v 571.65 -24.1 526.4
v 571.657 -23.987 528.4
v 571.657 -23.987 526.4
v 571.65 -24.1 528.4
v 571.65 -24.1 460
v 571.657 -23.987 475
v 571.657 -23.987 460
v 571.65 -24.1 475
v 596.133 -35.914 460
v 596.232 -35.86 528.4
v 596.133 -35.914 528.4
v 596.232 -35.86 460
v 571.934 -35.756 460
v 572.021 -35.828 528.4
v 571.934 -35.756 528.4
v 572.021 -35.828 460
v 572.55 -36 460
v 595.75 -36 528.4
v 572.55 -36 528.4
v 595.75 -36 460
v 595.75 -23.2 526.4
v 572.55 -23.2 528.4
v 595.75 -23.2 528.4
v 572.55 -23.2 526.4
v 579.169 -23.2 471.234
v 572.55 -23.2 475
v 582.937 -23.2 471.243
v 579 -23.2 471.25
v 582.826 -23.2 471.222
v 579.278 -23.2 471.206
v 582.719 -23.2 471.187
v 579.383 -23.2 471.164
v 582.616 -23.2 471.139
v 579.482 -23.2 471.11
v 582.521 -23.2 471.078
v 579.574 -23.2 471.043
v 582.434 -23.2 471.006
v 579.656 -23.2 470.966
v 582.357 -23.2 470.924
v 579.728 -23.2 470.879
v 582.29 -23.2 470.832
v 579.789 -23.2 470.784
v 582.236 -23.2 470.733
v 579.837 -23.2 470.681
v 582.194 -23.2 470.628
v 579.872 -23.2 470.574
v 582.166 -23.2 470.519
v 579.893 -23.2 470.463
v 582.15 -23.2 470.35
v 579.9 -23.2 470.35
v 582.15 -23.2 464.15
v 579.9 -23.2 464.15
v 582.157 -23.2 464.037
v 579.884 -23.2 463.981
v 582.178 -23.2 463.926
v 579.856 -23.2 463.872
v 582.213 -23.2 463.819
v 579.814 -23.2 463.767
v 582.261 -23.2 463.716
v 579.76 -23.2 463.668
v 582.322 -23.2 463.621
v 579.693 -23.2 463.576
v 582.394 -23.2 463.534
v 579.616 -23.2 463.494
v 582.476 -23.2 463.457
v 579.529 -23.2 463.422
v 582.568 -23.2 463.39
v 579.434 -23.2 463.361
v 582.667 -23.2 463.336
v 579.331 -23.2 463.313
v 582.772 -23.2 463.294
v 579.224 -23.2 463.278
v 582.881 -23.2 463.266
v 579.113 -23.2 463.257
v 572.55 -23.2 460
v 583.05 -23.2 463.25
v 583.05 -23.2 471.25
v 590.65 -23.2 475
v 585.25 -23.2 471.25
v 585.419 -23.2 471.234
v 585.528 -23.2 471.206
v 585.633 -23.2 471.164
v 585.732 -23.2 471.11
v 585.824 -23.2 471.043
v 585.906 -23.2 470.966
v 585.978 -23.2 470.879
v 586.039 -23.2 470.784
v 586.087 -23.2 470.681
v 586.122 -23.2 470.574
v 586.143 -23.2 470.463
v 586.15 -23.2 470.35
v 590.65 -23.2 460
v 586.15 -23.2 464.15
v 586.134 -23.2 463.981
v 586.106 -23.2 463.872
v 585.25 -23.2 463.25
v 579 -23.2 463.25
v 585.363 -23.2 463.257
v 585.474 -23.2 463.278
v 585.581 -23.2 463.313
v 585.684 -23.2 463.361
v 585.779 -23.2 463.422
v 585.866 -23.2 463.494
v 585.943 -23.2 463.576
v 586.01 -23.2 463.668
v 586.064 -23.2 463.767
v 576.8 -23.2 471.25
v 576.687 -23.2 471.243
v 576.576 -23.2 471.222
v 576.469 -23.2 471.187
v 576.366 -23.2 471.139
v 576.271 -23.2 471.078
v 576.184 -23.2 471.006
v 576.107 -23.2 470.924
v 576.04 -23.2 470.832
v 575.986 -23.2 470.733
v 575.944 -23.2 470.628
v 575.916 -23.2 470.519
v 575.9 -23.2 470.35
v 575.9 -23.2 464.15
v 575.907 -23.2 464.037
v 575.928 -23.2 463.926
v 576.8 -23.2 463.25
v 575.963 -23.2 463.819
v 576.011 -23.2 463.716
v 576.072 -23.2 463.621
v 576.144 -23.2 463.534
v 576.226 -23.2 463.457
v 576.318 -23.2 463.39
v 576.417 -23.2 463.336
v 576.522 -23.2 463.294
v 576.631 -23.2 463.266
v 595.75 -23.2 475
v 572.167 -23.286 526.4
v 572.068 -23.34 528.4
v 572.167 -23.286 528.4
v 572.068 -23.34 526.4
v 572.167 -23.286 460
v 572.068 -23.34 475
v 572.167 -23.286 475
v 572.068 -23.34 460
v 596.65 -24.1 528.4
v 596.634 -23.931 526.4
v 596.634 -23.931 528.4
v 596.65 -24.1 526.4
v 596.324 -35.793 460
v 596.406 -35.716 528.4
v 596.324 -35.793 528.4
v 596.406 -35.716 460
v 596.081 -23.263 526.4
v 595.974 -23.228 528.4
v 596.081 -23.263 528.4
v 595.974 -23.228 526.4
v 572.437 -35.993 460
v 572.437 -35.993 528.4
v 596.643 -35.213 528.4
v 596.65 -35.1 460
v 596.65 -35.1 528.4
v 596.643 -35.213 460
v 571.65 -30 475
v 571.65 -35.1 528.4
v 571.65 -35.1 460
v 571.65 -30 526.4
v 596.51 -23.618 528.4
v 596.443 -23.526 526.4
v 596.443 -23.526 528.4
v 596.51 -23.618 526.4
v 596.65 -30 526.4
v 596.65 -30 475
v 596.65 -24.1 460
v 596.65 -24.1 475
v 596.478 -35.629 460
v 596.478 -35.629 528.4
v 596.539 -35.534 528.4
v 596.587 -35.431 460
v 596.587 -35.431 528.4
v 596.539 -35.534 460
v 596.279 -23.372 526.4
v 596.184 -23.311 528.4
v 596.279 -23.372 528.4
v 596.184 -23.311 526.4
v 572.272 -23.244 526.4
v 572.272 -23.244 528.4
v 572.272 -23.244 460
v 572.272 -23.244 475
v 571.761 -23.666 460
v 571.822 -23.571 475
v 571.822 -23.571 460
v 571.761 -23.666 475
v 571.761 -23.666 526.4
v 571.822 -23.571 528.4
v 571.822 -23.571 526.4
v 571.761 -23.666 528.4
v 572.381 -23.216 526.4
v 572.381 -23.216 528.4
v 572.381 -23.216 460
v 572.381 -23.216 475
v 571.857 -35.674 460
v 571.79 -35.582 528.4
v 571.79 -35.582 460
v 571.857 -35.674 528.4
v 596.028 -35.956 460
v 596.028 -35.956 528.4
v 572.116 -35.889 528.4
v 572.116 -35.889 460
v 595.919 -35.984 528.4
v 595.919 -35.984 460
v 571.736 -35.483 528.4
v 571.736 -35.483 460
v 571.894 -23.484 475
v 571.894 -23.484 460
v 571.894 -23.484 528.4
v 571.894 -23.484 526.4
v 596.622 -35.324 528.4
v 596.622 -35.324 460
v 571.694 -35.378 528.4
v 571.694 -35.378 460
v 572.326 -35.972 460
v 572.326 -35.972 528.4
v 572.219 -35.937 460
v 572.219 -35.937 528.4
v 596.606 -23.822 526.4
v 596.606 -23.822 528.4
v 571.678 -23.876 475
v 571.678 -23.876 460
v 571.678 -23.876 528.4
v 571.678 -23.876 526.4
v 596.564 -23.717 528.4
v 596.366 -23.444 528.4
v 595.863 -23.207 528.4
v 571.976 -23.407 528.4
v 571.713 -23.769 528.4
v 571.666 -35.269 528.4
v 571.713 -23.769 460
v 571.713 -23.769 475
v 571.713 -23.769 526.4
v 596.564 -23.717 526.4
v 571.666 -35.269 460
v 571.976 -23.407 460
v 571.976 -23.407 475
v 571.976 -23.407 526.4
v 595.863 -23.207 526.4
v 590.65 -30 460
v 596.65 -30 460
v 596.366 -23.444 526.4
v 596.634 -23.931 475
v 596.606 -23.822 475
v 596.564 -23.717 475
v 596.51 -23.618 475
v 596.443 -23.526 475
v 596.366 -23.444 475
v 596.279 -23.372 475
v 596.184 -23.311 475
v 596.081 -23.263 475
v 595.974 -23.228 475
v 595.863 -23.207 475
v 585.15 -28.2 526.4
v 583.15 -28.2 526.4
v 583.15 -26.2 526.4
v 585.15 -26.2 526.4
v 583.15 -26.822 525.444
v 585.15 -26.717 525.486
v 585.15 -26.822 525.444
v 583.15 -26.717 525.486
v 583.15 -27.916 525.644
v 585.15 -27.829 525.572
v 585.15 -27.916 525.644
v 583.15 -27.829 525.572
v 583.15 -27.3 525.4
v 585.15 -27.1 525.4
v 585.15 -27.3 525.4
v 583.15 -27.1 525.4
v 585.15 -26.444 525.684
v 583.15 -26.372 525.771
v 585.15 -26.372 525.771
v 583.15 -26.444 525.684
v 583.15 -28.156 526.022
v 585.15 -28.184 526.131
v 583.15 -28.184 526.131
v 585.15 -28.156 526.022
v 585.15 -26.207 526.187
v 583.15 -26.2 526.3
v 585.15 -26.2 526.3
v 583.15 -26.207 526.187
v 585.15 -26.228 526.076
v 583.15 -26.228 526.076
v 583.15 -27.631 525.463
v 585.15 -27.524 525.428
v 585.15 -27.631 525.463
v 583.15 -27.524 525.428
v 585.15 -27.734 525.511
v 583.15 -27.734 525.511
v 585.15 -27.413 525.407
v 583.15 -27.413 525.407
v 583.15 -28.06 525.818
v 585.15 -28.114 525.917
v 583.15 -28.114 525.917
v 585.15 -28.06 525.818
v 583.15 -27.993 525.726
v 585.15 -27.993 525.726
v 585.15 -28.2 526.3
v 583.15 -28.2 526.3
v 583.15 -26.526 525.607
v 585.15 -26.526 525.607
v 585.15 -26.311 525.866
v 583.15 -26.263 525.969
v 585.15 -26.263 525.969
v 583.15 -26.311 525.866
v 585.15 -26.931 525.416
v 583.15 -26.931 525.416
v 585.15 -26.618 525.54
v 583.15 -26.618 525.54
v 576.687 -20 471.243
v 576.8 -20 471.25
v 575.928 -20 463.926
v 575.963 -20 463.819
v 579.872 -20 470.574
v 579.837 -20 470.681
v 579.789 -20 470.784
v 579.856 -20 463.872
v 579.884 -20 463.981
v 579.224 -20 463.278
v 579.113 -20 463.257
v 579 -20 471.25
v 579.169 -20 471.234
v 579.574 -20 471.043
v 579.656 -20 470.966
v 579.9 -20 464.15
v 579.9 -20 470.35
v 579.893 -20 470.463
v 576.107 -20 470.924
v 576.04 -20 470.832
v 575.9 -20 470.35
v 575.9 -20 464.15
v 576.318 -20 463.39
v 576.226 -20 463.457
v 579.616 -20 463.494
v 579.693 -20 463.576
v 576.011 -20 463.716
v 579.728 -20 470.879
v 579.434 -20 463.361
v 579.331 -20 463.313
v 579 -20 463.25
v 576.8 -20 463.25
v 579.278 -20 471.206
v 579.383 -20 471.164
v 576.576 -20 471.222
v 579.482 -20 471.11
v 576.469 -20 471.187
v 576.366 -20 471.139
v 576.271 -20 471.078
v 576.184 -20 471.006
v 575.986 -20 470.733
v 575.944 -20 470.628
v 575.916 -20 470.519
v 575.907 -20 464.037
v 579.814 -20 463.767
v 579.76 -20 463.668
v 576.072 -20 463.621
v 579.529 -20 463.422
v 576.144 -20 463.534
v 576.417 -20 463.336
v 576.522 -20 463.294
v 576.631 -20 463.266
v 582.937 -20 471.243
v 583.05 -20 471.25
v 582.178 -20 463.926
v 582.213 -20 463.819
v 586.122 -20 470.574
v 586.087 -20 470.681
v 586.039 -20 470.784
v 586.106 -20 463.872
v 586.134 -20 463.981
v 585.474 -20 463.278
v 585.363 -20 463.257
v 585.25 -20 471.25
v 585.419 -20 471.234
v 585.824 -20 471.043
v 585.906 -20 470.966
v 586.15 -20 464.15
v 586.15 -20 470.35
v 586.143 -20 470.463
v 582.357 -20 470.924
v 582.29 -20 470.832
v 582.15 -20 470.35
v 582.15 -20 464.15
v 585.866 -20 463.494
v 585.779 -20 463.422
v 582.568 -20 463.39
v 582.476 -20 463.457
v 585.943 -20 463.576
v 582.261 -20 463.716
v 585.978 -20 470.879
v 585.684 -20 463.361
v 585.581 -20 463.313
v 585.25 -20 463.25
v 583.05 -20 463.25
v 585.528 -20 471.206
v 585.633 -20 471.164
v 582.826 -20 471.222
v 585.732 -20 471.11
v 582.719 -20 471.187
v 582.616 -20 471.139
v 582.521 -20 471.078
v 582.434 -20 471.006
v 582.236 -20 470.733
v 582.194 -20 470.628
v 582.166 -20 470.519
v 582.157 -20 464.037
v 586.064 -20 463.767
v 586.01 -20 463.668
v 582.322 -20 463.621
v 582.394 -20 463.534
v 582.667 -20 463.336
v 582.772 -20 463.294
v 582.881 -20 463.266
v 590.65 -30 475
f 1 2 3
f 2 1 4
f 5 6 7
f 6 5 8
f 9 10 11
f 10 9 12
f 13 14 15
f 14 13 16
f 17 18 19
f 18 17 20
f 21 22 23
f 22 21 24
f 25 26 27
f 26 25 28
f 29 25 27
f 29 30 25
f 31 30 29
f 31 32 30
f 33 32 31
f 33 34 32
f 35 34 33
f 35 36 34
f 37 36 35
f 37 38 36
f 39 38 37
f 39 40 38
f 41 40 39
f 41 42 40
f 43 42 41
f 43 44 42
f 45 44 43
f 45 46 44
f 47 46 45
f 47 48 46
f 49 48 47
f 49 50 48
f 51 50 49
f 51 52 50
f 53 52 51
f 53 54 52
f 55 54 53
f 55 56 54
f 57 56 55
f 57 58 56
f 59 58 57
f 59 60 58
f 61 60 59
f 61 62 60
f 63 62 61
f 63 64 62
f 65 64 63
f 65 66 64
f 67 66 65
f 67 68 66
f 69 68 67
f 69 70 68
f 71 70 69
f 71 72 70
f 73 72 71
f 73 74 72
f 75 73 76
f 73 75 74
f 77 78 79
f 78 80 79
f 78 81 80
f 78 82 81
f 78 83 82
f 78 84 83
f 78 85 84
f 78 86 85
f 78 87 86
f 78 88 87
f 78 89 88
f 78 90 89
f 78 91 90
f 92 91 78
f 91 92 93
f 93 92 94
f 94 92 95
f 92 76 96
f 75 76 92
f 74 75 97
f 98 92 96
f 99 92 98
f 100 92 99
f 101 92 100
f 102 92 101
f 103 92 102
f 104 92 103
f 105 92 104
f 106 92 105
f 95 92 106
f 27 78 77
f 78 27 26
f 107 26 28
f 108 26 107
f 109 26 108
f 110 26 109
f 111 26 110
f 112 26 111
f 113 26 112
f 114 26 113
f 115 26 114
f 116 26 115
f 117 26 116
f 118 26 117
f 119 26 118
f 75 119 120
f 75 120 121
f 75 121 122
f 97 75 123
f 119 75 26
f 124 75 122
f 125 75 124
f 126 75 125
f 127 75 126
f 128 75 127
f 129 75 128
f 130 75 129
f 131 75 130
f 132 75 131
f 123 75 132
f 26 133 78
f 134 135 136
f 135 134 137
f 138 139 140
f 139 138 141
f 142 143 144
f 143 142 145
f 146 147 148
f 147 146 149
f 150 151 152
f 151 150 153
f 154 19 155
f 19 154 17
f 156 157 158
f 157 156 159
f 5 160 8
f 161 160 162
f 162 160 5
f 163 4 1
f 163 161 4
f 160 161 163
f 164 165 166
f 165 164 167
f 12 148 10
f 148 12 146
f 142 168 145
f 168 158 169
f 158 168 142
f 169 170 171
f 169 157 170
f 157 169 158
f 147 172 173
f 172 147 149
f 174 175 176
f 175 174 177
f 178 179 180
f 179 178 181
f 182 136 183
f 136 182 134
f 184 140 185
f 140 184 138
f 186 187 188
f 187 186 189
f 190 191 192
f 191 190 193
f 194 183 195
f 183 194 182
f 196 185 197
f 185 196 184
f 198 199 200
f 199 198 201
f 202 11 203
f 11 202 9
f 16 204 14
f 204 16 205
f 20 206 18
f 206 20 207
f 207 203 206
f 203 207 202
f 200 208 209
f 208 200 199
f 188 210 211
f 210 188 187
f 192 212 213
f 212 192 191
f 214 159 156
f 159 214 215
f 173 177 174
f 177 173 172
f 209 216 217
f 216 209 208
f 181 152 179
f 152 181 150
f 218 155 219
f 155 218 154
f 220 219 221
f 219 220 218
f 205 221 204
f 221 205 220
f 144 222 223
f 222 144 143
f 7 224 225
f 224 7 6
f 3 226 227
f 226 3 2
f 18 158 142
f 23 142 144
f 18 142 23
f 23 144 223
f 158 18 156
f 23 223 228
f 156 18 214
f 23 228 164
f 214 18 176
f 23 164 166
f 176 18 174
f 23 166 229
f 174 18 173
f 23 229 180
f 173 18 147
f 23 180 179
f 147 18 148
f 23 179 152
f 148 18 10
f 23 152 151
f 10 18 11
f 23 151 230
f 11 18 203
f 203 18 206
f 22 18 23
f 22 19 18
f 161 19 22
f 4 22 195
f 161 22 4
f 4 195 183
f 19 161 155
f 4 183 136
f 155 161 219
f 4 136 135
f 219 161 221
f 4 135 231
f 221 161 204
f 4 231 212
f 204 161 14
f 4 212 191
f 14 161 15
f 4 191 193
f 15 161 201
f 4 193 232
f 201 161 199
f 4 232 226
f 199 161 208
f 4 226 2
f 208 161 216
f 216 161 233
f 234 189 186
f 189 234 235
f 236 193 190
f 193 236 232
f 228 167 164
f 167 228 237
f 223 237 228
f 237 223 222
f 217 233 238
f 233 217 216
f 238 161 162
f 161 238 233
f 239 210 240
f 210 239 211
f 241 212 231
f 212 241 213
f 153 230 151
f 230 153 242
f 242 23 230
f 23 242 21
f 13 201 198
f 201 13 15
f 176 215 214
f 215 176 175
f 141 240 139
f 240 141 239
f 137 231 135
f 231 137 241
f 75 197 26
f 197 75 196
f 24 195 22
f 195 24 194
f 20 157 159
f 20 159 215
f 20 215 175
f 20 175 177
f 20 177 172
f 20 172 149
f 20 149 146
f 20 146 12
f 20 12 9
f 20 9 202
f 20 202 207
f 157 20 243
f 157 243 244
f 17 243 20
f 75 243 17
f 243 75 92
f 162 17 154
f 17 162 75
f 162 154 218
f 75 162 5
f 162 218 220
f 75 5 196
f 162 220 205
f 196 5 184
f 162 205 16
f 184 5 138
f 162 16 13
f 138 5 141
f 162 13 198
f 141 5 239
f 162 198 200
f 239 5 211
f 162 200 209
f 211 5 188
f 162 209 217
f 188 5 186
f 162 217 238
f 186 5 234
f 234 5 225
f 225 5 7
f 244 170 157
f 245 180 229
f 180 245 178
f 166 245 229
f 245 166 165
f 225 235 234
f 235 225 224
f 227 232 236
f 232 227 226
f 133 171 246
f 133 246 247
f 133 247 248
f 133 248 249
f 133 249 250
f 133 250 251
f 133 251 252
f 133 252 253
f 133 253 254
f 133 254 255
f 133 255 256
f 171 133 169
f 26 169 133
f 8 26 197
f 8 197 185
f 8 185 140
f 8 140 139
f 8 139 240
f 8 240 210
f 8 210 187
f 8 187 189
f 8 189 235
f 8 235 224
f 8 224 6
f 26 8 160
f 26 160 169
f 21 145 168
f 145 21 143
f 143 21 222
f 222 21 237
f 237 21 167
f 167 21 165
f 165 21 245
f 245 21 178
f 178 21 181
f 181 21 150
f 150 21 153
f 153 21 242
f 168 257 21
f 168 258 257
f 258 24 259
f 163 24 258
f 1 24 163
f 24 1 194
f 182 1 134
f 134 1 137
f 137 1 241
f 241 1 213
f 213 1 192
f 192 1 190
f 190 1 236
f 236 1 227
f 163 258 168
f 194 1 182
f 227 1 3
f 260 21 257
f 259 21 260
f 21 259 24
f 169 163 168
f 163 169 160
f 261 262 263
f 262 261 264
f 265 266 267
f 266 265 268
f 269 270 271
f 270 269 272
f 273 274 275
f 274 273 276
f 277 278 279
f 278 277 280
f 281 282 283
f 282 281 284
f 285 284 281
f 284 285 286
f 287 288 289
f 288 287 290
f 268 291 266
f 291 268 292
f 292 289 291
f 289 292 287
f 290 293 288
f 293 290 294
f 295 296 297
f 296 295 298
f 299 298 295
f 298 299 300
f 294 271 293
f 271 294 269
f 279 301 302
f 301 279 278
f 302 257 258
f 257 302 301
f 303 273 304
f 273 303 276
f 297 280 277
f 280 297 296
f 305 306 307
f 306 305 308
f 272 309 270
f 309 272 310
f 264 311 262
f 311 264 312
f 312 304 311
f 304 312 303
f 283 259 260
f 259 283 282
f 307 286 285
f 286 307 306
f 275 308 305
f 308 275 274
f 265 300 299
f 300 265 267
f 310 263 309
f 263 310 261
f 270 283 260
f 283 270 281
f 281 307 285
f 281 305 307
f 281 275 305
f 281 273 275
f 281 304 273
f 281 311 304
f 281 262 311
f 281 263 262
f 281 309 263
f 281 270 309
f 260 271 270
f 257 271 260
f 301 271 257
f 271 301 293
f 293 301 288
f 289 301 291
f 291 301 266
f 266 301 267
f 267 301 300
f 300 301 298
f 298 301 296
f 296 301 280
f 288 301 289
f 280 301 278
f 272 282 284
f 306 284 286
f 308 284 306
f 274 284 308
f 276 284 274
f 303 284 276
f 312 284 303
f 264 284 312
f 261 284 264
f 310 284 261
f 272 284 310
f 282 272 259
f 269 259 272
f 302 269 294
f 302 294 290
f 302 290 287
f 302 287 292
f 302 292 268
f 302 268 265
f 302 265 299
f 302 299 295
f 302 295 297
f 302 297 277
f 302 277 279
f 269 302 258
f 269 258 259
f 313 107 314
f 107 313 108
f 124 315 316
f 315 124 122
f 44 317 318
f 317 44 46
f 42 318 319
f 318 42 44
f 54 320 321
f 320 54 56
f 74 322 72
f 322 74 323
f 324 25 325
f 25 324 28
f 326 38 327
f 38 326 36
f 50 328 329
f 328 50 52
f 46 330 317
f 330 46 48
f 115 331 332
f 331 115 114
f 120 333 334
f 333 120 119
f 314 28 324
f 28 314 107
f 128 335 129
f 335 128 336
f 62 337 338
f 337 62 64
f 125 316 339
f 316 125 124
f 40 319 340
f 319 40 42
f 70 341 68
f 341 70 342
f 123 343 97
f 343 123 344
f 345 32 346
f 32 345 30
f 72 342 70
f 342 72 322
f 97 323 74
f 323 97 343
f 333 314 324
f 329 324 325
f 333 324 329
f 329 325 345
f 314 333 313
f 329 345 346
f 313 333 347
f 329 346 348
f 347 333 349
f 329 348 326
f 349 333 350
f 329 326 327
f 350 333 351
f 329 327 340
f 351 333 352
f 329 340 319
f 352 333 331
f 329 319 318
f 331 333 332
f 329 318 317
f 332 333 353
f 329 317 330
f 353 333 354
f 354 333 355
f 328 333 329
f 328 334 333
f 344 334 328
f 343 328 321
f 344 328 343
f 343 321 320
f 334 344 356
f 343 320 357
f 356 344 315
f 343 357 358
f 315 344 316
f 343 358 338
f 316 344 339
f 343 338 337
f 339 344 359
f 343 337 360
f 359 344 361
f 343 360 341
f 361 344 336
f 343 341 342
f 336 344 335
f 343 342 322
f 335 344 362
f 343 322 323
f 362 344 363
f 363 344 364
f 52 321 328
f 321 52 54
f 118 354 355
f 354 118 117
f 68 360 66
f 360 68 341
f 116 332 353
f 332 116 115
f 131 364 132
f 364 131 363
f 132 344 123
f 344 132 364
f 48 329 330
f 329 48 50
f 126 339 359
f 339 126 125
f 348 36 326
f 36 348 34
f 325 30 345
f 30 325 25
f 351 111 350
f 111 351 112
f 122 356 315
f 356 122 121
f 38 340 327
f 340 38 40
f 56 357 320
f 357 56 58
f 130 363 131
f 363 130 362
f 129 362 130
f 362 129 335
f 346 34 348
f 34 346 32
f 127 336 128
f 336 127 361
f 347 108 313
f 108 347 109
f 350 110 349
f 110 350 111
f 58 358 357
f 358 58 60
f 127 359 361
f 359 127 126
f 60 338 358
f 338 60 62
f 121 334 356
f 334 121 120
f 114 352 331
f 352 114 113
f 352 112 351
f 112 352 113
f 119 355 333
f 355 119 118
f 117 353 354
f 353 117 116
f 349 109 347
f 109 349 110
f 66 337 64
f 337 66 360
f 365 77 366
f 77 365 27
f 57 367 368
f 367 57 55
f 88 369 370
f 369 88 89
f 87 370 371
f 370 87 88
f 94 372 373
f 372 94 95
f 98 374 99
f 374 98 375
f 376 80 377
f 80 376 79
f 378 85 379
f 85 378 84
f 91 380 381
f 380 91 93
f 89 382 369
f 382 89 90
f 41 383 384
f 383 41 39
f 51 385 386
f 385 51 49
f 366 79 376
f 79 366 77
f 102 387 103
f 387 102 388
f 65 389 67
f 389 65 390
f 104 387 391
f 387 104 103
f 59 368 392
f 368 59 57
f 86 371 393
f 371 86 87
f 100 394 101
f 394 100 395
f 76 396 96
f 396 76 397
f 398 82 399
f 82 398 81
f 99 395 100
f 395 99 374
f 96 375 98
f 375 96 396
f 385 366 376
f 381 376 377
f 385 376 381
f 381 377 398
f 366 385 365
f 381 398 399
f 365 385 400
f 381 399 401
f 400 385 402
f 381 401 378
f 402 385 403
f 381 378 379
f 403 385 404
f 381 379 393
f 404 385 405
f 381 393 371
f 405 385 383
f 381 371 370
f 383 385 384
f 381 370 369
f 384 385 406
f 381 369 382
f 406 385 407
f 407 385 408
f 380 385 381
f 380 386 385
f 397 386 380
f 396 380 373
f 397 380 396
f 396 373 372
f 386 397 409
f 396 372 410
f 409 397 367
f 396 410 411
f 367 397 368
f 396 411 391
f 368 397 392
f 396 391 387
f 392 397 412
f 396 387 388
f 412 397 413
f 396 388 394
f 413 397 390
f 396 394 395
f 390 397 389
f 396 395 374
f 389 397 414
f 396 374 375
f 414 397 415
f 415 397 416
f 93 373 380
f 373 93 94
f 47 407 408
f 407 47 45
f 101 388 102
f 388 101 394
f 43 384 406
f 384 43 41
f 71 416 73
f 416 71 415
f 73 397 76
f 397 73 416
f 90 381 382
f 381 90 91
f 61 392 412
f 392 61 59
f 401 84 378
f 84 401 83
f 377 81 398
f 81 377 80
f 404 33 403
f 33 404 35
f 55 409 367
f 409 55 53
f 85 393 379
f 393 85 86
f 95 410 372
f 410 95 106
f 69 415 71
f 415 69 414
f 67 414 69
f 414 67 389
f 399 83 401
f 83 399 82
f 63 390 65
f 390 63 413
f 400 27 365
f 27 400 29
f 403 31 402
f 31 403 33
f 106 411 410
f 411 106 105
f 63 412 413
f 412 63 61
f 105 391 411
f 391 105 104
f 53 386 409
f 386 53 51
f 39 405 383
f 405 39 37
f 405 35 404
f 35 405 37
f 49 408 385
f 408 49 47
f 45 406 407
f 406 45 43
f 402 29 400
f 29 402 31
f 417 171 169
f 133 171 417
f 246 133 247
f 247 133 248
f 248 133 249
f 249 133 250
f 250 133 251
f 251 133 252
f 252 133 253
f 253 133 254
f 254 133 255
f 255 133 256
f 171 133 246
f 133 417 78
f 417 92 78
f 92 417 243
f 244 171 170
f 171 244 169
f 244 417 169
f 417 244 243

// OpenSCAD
// file: front_right_top_corner.scad
include <parameters.scad>
use <utility.scad>
use <support.scad>
use <construction.scad>

module front_right_top_corner() {
    difference() {
        translate([enclosure_width,0,enclosure_height-frame_corner_height]) 
            mirror([1,0,0])
                add_snap_lock_slot(top=true) 
                add_hinge_post(top=true)  
                add_outside_frame(frame_corner_height) 
                add_connector_slot()
                extend_frame_x()
                    color("SteelBlue")
                    frame_corner( frame_corner_width, 
                        frame_corner_height,frame_thickness, 
                        corner_roundness);
        fix_preview() right_wall_panel();
    }
}
// file: construction.scad
/*
Specialized construction functions specifically for the enclosure.
By combining these operators the various instances of enclosure pieces 
can be constructed.
*/
include <parameters.scad>;
use <utility.scad>;

module lug() {
    ra = knob_diameter/2;
    rb = lug_diameter/2;
    rotate([0,90,90]) 
        rotate_extrude()
            polygon([[0,0],[0,lug_height],[rb,lug_height],
                [rb,2.5],[ra,1],[ra,0]]);
}

// extend the corner frame to be symmetrical with the front corner
module extend_frame_x(height=frame_corner_height) {
    union() {
        children();
        color("SteelBlue")
        translate([hinge_inner_diameter*2, hinge_inner_diameter,0]) 
            rotate([0,0,-90])
                frame( hinge_inner_diameter*3+1, 
                    height, hinge_inner_diameter, 
                    corner_roundness );
    }
}

module frame( width, height, thickness, roundness ) {
        linear_extrude(height=height)
            apply_roundness(roundness, $fs =0.01) 
                    square( [thickness, width] );
}

module frame_corner( width, height, thickness, roundness ) {    
    union() {
        mirror([0,1,0]) 
            rotate([0,0,-90])
                frame( width, height, thickness, roundness );
        frame( width, height, thickness + panel_thickness, roundness );
    }   
}

module frame_connector_corner(clearance=0) {
    translate([panel_thickness*1.7,panel_thickness*0.70, 0]) 
        cornerize()
            frame( frame_corner_width*0.75, frame_connector_depth, 
                frame_thickness*.20+clearance, corner_roundness );
        
}

module add_lugs() {   
    union() {
        children();

        color("DarkSeaGreen")
        translate([lug_offset_x,-lug_height,lug_offset_z]) 
            lug();

        color("DarkSeaGreen")
        translate([lug_offset_x,-lug_height,
                lug_offset_z+lug_offset_gap])
            lug(); 
    } 
}

module add_connector(height=frame_corner_height) {
    union() {
        children();

        color("SteelBlue")
        translate([0,0,height])
            frame_connector_corner();
    }
}

module add_hinge_post( top=false ) {
    union() {
        difference() {
            children();

            // create a negative space that snuggly fits the hinge
            translate([frame_corner_width+plastic_thickness+hinge_gap,
                hinge_inner_diameter/2, (top?frame_corner_height:0)])
                mirror(top?[0,0,1]:[0,0,0])
                    union() {
                        height = hinge_height-hinge_inner_diameter;
                        translate([0,0,height/2-0.65]) 
                            cube([hinge_inner_diameter+2,
                                hinge_inner_diameter+2,height],true);
                        
                        // hinge open
                        rotate([0,0,-90]) 
                            translate([0,0,-1.4]) 
                                scale(1.05) hinge();
                        // hinge closed
                        rotate([0,0,0]) 
                            translate([0,0,-1.4]) 
                                scale(1.05) hinge();
                    }
            
        }
        color("SteelBlue")
        translate([frame_corner_width+plastic_thickness+hinge_gap,hinge_inner_diameter/2,0])
            cylinder(d=hinge_inner_diameter, frame_corner_height);
    }
}

module add_outside_frame( height ) {
    union() {
        children();
        translate([-plastic_thickness,-plastic_thickness,0])
            color("SteelBlue")
            frame( frame_corner_width+plastic_thickness, height, frame_thickness,
                corner_roundness);
        translate([14.5,0.05,height/2])
            color("SteelBlue")
            rotate([0,0,8])
            cube([frame_corner_width/2,plastic_thickness,height],true);
    }
}

module hinge() {
    height = hinge_height-hinge_inner_diameter;
    width = hinge_inner_diameter+hinge_ring_thickness;
    difference() {
        
        // create the base shape for the hinge
        union() {    
            cylinder(d=width, height);
            
            translate([hinge_inner_diameter*3+hinge_clearance,
                -hinge_offset,height/2-plastic_thickness/2]) 
                cube([hinge_length,hinge_thickness,
                    height+plastic_thickness],true);
           
            translate([2.52,-5.2,height/2]) 
                rotate([0,0,40]) 
                    cube([hinge_inner_diameter,
                        width+1,height],true);
        }
        
        // remove a hole for the hinge post to slide into
        cylinder(d=hinge_inner_diameter+tolerance_smooth, height+1);
        
        // trim the left corner
        translate([4,-17.5,height/2-1]) 
            rotate([0,0,145]) 
                cube([50,width-2,height+3],true);
        
        // smooth the tranistion to the bottom edge
        translate([19,-10,height/2-17.85]) 
            rotate([-88.5,0.1,96]) 
                cube([40,20,100],true);
        
        // add a chamfer to right corner
        translate([hinge_length+8,0,height+25]) 
            rotate([0,45,0]) 
            cube(50,true);
    }   
}

module add_connector_slot() {
    difference() {
        children();
        frame_connector_corner(tolerance_tight);
    }
}

module frame_vertical() {
    add_connector_slot()
    add_connector(frame_vertical_height)
    extend_frame_x(frame_vertical_height)
        frame_corner( frame_corner_width, 
            frame_vertical_height, frame_thickness, 
            corner_roundness );          
}

module add_snap_lock_slot(top=false) {
    difference() {
        children();
        translate([0,0,top?frame_corner_height+shelf_height:-shelf_height])
            mirror(top?[0,0,1]:[0,0,0])
                 snaplock(tolerance_tight,top);
    }
}

module snaplock(clearance=0,top=false) {
    
    union() {
        difference() {
            translate([snaplock_size,-snaplock_thickness*3,-plastic_thickness])
                rotate([0,0,90])
                    frame(snaplock_size+clearance,shelf_height+snaplock_connector_size+plastic_thickness+clearance,
                        snaplock_width*2+plastic_thickness, corner_roundness);
            fix_preview2() cube([snaplock_size*1.1,snaplock_width+plastic_thickness,shelf_height]);
        }
        // lug at bottom
        translate([snaplock_size - snaplock_size/2 - plastic_thickness/2,plastic_thickness-0.2,1])
            rotate([90,90,90])
                frame(plastic_thickness,plastic_thickness,plastic_thickness,corner_roundness);
        // connector
        translate([3*snaplock_size/4-connector_thickness/2,
            frame_connector_depth+snaplock_thickness,
            shelf_height+snaplock_connector_size/2 - (snaplock_connector_size/4)])
            rotate([90,0,0])
            frame(frame_connector_depth,snaplock_connector_size/2,
                connector_thickness,corner_roundness);
        translate([(top?2:1)*snaplock_size/4-connector_thickness/2,
            frame_connector_depth+snaplock_thickness,
            shelf_height+snaplock_connector_size/2 - (snaplock_connector_size/4)])
            rotate([90,0,0])
            frame(frame_connector_depth,snaplock_connector_size/2,
                connector_thickness,corner_roundness);
    }
}
// file: support.scad
/*
Provides support objects that are used to model the environment of the enclosure
to ensure the pieces slot together and fit properly.
*/
include <parameters.scad>;
use <utility.scad>;

module wall_panel() {
    cube([panel_height,panel_width,panel_thickness]);
}

module door_panel() {
     cube([door_panel_width,door_panel_height,door_panel_thickness]);
}

module left_wall_panel() {
    translate([panel_thickness,0,panel_offset_z]) 
        rotate([0,-90,0]) 
            wall_panel();
}

module back_wall_panel() {
    translate([(enclosure_width-panel_width)/2,
            enclosure_depth-panel_thickness-plastic_thickness,
            panel_offset_z]) 
        rotate([-90,-90,0]) 
            wall_panel();
}

module right_wall_panel() {
    translate([enclosure_width,0,panel_offset_z]) 
        rotate([0,-90,0]) 
            wall_panel();
}

module left_door(open=false) {
    translate([frame_corner_width+plastic_thickness+hinge_gap,
            hinge_inner_diameter/2,0]) 
        rotate([90,0,open?-90:0]) 
            translate([door_hinge_offset,0,hinge_offset-
                    door_panel_thickness/2])
                door_panel();
}

module right_door(open=false) {
    translate([enclosure_width,0,0])  
        mirror([1,0,0]) left_door(open);
}
// file: utility.scad
/*
Generically useful utility functions.
*/

// applies roundness without altering dimensions of object
module apply_roundness(r)
    offset(r) offset(delta=-r) children(0);

// makes a corner piece by mirroring and rotating one side
module cornerize() {
    union() {
        children(0);
        mirror([0,1,0]) 
            rotate([0,0,-90])
                children(0);
    }
} 

module explode(vector) {
    for(i=[0:$children-1])
        translate(vector*i)
            children(i);

}

/*
 The fix_preview series of functions are used to make small
 translations in order to reduce conincident plane artifacts
 from the preview mode. 

 It would be nice to have just one module for this but I haven't
 figured out a way of doing this generically - so the following
 uses a small translation in different directions depending on
 the use case needed.
*/
module fix_preview() {
    translate($preview?[-0.001,-0.001,-0.001]:[0,0,0])
        children(0);
}

module fix_preview2() {
    translate($preview?[-0.001,0.001,-0.001]:[0,0,0])
        children(0);
}

module fix_preview3() {
    translate($preview?[-0.001,0.001,0.001]:[0,0,0])
        children(0);
}
// file: parameters.scad
$fn=50;

// Wall thickness and tolerance
plastic_thickness=2.0;
tolerance_smooth=0.45;
tolerance_tight=0.40;
corner_roundness=0.9;

// Specify enclosure dimensions
enclosure_height=475.0;
enclosure_depth=535.0;

// Wall panel dimensions
panel_thickness=6.0;
panel_height=450.0;
panel_width=535.0;
panel_offset_z = enclosure_height - panel_height;

// Door panel dimensions
door_panel_thickness=3.0;
door_panel_width=250.0;
door_panel_height=475.0;
door_hinge_offset=6.5;

// Frame
frame_corner_width=30.0;
frame_corner_height=79.0;
frame_thickness = plastic_thickness*2 + panel_thickness;
frame_side = (enclosure_height - frame_corner_height*2)/2;
frame_clip_height=50.5;
frame_vertical_height = (enclosure_height-frame_corner_height*2)/2;
frame_connector_depth = 8.0;

// Lug
knob_diameter=9.8;
lug_diameter=6.2;
lug_gap=1.4;
lug_height = lug_gap+2.15;
lug_offset_x=15.0;
lug_offset_z=27.0;
lug_offset_gap=32;

// Snaplock
shelf_height=51.0+tolerance_tight;
snaplock_width=5+tolerance_tight;
snaplock_size=25;
snaplock_thickness=plastic_thickness;
snaplock_connector_size=15;
connector_thickness=frame_thickness*.4;

// Door hinge
hinge_inner_diameter=10;
hinge_height=25;
hinge_length=53;
hinge_gap = 9.6;
hinge_clearance = 1.5;
hinge_ring_thickness=3.0;
hinge_thickness=plastic_thickness*2 + door_panel_thickness;
hinge_offset=6.5+plastic_thickness;

enclosure_width=2*(frame_corner_width+plastic_thickness+hinge_gap
    +door_hinge_offset) + door_panel_width*2 +tolerance_smooth;
// main file
include <parameters.scad>
use <utility.scad>
use <support.scad>
use <construction.scad>
use <front_right_top_corner.scad>

module front_right_top_snaplock() {
    difference() {
        translate([enclosure_width, 0, enclosure_height+shelf_height])
            mirror([1,0,0])
            mirror([0,0,1])
                color("Magenta")
                snaplock(top=true);
        fix_preview() right_wall_panel();
    }
}

fix_preview() %right_wall_panel();
%front_right_top_corner();
translate([0,-30,0])
    front_right_top_snaplock();
